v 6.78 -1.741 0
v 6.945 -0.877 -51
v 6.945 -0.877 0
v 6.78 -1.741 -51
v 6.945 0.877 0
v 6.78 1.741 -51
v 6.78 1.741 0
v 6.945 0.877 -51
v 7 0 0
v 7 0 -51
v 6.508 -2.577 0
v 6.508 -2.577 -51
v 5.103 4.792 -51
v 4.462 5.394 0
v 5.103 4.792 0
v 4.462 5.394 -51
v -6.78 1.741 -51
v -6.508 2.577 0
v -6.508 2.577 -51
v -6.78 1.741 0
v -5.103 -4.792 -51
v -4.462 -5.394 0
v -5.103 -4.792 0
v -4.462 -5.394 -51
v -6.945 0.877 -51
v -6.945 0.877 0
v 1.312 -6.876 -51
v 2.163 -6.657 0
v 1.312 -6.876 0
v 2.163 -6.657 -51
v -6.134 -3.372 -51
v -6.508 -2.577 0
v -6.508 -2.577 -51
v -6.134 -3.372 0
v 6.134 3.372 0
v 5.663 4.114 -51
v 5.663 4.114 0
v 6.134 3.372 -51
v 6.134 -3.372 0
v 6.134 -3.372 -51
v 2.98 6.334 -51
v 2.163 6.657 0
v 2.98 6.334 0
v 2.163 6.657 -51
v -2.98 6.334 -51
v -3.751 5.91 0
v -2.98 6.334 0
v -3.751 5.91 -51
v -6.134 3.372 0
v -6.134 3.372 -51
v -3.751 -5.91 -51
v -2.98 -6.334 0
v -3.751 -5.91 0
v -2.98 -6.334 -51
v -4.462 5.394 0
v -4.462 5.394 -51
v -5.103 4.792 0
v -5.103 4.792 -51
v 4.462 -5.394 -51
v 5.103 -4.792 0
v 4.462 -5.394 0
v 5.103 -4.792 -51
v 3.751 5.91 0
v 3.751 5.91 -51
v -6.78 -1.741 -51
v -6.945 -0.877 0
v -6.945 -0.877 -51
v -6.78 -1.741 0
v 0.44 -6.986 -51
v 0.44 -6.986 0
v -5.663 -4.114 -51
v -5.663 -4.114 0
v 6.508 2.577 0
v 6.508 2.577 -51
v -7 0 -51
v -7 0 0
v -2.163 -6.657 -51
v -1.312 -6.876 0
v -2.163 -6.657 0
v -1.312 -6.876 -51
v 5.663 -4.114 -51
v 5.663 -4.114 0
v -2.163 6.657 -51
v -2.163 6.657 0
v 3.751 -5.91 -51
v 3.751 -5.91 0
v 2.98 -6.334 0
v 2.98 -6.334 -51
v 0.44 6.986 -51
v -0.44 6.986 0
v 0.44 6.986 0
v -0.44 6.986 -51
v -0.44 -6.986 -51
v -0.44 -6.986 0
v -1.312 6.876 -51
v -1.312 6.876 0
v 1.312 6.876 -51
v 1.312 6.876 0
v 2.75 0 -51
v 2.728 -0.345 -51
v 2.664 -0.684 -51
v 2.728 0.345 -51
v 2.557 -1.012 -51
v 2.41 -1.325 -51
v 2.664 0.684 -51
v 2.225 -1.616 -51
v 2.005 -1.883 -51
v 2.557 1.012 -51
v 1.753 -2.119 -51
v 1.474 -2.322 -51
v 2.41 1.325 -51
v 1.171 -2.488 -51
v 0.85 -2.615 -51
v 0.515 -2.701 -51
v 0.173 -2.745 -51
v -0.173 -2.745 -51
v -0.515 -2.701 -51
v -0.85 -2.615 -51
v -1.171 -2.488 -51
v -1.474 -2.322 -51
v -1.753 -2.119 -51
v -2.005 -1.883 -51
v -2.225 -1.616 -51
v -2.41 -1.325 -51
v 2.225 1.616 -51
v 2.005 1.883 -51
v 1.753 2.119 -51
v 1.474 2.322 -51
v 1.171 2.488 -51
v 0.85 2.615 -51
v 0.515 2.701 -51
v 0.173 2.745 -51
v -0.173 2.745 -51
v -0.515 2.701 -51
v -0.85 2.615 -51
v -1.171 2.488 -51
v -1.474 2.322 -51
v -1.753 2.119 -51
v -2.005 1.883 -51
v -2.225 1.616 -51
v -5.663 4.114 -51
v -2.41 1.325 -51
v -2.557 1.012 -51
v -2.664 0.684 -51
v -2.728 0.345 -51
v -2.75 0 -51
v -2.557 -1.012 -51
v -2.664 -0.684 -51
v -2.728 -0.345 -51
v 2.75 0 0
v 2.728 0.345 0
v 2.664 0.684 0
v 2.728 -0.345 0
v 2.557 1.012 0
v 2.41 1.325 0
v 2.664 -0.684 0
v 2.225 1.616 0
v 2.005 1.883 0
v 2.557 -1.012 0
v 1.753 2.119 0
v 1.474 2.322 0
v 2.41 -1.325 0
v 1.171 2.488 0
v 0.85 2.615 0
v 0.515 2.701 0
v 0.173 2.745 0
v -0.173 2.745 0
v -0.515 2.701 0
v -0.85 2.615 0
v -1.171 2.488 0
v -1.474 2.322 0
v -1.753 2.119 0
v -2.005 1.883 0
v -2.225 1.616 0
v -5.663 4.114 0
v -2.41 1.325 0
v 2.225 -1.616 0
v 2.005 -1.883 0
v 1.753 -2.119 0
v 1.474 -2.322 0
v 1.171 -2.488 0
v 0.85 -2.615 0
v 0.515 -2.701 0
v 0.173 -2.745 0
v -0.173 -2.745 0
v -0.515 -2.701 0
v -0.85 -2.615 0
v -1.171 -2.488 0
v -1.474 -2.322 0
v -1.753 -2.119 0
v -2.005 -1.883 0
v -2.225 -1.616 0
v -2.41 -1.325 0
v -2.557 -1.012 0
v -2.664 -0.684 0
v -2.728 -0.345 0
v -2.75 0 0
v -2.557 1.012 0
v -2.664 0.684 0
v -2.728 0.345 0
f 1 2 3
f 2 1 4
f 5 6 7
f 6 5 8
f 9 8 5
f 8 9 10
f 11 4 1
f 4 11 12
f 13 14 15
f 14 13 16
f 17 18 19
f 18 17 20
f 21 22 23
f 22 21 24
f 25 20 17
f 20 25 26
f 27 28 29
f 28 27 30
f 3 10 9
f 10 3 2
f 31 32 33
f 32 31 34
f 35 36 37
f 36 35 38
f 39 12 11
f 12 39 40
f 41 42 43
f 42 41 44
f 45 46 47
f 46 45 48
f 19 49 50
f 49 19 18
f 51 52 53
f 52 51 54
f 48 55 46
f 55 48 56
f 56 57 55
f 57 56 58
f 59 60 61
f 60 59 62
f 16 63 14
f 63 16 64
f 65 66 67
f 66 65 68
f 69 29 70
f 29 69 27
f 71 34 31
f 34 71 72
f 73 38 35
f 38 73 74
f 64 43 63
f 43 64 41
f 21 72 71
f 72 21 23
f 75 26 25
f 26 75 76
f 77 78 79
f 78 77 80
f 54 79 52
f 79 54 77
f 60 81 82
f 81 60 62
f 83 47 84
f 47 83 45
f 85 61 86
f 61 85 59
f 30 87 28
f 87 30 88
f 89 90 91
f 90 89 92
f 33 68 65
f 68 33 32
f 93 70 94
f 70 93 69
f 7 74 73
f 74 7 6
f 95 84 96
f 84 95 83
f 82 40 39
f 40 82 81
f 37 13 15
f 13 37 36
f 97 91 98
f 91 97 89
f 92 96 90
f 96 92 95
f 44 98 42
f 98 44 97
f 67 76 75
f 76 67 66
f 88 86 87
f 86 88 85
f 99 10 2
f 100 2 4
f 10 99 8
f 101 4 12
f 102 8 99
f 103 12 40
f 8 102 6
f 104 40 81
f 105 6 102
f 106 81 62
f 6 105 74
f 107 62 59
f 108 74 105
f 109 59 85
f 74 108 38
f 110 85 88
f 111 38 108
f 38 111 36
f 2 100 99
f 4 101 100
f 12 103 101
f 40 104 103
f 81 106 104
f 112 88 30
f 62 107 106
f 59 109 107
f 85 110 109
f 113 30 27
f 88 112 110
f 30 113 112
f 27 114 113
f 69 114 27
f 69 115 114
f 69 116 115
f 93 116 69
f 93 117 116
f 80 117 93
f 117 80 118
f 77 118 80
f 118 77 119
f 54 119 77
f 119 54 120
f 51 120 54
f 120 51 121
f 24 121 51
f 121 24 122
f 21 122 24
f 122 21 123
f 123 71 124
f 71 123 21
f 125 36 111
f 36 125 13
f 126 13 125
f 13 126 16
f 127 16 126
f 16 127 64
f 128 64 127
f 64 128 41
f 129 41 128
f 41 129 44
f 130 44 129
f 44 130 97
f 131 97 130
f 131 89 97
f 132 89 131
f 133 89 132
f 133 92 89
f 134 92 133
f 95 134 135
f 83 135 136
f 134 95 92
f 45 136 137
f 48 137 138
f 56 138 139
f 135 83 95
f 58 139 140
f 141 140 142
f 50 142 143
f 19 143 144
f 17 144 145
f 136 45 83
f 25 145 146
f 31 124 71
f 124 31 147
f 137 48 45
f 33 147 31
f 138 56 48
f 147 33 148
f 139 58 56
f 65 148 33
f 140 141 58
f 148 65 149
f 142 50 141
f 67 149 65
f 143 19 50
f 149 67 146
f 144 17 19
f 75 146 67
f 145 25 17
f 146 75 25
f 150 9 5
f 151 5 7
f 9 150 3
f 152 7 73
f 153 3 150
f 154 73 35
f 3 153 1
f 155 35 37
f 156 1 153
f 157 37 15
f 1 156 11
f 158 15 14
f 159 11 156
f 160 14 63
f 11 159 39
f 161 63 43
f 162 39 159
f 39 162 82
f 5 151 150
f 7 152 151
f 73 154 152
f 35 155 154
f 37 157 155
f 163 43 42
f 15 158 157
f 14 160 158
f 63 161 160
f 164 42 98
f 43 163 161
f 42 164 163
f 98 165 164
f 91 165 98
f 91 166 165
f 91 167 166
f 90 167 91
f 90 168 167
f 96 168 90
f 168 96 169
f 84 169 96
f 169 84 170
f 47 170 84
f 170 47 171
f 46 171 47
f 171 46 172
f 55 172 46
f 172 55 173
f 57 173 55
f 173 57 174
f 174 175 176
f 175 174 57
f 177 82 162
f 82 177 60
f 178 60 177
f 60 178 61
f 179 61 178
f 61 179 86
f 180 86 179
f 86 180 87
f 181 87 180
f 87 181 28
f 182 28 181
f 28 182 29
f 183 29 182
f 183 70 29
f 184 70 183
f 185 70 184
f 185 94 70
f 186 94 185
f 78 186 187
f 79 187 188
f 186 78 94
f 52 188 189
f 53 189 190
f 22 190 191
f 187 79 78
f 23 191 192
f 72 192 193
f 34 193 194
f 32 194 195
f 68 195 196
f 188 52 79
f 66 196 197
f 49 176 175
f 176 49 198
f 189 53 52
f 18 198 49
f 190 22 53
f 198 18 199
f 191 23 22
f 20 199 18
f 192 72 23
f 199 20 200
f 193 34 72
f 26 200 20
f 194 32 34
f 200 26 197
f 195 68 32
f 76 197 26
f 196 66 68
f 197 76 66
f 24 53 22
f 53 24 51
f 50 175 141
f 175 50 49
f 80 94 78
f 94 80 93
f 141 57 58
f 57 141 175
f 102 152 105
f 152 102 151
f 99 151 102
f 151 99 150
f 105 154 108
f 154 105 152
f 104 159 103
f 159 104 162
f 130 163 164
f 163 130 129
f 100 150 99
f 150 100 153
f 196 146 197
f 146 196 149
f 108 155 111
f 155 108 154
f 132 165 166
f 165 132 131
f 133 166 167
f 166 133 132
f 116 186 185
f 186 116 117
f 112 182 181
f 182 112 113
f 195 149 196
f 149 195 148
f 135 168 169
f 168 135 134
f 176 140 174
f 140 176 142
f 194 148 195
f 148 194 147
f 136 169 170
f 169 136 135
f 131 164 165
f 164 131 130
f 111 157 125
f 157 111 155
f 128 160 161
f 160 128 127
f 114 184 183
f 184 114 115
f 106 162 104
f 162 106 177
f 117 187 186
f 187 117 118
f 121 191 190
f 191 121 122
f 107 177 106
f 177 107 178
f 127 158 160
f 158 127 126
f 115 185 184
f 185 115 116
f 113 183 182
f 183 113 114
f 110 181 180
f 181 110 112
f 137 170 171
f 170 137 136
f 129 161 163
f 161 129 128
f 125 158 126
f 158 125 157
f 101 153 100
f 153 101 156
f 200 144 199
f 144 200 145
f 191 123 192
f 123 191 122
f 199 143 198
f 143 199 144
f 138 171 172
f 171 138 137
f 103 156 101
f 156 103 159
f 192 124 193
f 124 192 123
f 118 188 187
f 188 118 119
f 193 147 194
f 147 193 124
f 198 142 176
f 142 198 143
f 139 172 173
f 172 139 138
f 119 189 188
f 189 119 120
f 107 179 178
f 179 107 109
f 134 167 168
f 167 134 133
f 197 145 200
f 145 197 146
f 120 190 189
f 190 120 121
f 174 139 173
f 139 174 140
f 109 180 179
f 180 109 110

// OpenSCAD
$fn = 50;


difference() {
	union() {
		translate(v = [0, 0, -51.0000000000]) {
			cylinder(h = 51, r = 7.0000000000);
		}
		cylinder(h = 0, r = 13.0000000000);
	}
	union() {
		#translate(v = [0, 0, -51]) {
			cylinder(h = 51, r = 2.7500000000);
		}
	}
}
